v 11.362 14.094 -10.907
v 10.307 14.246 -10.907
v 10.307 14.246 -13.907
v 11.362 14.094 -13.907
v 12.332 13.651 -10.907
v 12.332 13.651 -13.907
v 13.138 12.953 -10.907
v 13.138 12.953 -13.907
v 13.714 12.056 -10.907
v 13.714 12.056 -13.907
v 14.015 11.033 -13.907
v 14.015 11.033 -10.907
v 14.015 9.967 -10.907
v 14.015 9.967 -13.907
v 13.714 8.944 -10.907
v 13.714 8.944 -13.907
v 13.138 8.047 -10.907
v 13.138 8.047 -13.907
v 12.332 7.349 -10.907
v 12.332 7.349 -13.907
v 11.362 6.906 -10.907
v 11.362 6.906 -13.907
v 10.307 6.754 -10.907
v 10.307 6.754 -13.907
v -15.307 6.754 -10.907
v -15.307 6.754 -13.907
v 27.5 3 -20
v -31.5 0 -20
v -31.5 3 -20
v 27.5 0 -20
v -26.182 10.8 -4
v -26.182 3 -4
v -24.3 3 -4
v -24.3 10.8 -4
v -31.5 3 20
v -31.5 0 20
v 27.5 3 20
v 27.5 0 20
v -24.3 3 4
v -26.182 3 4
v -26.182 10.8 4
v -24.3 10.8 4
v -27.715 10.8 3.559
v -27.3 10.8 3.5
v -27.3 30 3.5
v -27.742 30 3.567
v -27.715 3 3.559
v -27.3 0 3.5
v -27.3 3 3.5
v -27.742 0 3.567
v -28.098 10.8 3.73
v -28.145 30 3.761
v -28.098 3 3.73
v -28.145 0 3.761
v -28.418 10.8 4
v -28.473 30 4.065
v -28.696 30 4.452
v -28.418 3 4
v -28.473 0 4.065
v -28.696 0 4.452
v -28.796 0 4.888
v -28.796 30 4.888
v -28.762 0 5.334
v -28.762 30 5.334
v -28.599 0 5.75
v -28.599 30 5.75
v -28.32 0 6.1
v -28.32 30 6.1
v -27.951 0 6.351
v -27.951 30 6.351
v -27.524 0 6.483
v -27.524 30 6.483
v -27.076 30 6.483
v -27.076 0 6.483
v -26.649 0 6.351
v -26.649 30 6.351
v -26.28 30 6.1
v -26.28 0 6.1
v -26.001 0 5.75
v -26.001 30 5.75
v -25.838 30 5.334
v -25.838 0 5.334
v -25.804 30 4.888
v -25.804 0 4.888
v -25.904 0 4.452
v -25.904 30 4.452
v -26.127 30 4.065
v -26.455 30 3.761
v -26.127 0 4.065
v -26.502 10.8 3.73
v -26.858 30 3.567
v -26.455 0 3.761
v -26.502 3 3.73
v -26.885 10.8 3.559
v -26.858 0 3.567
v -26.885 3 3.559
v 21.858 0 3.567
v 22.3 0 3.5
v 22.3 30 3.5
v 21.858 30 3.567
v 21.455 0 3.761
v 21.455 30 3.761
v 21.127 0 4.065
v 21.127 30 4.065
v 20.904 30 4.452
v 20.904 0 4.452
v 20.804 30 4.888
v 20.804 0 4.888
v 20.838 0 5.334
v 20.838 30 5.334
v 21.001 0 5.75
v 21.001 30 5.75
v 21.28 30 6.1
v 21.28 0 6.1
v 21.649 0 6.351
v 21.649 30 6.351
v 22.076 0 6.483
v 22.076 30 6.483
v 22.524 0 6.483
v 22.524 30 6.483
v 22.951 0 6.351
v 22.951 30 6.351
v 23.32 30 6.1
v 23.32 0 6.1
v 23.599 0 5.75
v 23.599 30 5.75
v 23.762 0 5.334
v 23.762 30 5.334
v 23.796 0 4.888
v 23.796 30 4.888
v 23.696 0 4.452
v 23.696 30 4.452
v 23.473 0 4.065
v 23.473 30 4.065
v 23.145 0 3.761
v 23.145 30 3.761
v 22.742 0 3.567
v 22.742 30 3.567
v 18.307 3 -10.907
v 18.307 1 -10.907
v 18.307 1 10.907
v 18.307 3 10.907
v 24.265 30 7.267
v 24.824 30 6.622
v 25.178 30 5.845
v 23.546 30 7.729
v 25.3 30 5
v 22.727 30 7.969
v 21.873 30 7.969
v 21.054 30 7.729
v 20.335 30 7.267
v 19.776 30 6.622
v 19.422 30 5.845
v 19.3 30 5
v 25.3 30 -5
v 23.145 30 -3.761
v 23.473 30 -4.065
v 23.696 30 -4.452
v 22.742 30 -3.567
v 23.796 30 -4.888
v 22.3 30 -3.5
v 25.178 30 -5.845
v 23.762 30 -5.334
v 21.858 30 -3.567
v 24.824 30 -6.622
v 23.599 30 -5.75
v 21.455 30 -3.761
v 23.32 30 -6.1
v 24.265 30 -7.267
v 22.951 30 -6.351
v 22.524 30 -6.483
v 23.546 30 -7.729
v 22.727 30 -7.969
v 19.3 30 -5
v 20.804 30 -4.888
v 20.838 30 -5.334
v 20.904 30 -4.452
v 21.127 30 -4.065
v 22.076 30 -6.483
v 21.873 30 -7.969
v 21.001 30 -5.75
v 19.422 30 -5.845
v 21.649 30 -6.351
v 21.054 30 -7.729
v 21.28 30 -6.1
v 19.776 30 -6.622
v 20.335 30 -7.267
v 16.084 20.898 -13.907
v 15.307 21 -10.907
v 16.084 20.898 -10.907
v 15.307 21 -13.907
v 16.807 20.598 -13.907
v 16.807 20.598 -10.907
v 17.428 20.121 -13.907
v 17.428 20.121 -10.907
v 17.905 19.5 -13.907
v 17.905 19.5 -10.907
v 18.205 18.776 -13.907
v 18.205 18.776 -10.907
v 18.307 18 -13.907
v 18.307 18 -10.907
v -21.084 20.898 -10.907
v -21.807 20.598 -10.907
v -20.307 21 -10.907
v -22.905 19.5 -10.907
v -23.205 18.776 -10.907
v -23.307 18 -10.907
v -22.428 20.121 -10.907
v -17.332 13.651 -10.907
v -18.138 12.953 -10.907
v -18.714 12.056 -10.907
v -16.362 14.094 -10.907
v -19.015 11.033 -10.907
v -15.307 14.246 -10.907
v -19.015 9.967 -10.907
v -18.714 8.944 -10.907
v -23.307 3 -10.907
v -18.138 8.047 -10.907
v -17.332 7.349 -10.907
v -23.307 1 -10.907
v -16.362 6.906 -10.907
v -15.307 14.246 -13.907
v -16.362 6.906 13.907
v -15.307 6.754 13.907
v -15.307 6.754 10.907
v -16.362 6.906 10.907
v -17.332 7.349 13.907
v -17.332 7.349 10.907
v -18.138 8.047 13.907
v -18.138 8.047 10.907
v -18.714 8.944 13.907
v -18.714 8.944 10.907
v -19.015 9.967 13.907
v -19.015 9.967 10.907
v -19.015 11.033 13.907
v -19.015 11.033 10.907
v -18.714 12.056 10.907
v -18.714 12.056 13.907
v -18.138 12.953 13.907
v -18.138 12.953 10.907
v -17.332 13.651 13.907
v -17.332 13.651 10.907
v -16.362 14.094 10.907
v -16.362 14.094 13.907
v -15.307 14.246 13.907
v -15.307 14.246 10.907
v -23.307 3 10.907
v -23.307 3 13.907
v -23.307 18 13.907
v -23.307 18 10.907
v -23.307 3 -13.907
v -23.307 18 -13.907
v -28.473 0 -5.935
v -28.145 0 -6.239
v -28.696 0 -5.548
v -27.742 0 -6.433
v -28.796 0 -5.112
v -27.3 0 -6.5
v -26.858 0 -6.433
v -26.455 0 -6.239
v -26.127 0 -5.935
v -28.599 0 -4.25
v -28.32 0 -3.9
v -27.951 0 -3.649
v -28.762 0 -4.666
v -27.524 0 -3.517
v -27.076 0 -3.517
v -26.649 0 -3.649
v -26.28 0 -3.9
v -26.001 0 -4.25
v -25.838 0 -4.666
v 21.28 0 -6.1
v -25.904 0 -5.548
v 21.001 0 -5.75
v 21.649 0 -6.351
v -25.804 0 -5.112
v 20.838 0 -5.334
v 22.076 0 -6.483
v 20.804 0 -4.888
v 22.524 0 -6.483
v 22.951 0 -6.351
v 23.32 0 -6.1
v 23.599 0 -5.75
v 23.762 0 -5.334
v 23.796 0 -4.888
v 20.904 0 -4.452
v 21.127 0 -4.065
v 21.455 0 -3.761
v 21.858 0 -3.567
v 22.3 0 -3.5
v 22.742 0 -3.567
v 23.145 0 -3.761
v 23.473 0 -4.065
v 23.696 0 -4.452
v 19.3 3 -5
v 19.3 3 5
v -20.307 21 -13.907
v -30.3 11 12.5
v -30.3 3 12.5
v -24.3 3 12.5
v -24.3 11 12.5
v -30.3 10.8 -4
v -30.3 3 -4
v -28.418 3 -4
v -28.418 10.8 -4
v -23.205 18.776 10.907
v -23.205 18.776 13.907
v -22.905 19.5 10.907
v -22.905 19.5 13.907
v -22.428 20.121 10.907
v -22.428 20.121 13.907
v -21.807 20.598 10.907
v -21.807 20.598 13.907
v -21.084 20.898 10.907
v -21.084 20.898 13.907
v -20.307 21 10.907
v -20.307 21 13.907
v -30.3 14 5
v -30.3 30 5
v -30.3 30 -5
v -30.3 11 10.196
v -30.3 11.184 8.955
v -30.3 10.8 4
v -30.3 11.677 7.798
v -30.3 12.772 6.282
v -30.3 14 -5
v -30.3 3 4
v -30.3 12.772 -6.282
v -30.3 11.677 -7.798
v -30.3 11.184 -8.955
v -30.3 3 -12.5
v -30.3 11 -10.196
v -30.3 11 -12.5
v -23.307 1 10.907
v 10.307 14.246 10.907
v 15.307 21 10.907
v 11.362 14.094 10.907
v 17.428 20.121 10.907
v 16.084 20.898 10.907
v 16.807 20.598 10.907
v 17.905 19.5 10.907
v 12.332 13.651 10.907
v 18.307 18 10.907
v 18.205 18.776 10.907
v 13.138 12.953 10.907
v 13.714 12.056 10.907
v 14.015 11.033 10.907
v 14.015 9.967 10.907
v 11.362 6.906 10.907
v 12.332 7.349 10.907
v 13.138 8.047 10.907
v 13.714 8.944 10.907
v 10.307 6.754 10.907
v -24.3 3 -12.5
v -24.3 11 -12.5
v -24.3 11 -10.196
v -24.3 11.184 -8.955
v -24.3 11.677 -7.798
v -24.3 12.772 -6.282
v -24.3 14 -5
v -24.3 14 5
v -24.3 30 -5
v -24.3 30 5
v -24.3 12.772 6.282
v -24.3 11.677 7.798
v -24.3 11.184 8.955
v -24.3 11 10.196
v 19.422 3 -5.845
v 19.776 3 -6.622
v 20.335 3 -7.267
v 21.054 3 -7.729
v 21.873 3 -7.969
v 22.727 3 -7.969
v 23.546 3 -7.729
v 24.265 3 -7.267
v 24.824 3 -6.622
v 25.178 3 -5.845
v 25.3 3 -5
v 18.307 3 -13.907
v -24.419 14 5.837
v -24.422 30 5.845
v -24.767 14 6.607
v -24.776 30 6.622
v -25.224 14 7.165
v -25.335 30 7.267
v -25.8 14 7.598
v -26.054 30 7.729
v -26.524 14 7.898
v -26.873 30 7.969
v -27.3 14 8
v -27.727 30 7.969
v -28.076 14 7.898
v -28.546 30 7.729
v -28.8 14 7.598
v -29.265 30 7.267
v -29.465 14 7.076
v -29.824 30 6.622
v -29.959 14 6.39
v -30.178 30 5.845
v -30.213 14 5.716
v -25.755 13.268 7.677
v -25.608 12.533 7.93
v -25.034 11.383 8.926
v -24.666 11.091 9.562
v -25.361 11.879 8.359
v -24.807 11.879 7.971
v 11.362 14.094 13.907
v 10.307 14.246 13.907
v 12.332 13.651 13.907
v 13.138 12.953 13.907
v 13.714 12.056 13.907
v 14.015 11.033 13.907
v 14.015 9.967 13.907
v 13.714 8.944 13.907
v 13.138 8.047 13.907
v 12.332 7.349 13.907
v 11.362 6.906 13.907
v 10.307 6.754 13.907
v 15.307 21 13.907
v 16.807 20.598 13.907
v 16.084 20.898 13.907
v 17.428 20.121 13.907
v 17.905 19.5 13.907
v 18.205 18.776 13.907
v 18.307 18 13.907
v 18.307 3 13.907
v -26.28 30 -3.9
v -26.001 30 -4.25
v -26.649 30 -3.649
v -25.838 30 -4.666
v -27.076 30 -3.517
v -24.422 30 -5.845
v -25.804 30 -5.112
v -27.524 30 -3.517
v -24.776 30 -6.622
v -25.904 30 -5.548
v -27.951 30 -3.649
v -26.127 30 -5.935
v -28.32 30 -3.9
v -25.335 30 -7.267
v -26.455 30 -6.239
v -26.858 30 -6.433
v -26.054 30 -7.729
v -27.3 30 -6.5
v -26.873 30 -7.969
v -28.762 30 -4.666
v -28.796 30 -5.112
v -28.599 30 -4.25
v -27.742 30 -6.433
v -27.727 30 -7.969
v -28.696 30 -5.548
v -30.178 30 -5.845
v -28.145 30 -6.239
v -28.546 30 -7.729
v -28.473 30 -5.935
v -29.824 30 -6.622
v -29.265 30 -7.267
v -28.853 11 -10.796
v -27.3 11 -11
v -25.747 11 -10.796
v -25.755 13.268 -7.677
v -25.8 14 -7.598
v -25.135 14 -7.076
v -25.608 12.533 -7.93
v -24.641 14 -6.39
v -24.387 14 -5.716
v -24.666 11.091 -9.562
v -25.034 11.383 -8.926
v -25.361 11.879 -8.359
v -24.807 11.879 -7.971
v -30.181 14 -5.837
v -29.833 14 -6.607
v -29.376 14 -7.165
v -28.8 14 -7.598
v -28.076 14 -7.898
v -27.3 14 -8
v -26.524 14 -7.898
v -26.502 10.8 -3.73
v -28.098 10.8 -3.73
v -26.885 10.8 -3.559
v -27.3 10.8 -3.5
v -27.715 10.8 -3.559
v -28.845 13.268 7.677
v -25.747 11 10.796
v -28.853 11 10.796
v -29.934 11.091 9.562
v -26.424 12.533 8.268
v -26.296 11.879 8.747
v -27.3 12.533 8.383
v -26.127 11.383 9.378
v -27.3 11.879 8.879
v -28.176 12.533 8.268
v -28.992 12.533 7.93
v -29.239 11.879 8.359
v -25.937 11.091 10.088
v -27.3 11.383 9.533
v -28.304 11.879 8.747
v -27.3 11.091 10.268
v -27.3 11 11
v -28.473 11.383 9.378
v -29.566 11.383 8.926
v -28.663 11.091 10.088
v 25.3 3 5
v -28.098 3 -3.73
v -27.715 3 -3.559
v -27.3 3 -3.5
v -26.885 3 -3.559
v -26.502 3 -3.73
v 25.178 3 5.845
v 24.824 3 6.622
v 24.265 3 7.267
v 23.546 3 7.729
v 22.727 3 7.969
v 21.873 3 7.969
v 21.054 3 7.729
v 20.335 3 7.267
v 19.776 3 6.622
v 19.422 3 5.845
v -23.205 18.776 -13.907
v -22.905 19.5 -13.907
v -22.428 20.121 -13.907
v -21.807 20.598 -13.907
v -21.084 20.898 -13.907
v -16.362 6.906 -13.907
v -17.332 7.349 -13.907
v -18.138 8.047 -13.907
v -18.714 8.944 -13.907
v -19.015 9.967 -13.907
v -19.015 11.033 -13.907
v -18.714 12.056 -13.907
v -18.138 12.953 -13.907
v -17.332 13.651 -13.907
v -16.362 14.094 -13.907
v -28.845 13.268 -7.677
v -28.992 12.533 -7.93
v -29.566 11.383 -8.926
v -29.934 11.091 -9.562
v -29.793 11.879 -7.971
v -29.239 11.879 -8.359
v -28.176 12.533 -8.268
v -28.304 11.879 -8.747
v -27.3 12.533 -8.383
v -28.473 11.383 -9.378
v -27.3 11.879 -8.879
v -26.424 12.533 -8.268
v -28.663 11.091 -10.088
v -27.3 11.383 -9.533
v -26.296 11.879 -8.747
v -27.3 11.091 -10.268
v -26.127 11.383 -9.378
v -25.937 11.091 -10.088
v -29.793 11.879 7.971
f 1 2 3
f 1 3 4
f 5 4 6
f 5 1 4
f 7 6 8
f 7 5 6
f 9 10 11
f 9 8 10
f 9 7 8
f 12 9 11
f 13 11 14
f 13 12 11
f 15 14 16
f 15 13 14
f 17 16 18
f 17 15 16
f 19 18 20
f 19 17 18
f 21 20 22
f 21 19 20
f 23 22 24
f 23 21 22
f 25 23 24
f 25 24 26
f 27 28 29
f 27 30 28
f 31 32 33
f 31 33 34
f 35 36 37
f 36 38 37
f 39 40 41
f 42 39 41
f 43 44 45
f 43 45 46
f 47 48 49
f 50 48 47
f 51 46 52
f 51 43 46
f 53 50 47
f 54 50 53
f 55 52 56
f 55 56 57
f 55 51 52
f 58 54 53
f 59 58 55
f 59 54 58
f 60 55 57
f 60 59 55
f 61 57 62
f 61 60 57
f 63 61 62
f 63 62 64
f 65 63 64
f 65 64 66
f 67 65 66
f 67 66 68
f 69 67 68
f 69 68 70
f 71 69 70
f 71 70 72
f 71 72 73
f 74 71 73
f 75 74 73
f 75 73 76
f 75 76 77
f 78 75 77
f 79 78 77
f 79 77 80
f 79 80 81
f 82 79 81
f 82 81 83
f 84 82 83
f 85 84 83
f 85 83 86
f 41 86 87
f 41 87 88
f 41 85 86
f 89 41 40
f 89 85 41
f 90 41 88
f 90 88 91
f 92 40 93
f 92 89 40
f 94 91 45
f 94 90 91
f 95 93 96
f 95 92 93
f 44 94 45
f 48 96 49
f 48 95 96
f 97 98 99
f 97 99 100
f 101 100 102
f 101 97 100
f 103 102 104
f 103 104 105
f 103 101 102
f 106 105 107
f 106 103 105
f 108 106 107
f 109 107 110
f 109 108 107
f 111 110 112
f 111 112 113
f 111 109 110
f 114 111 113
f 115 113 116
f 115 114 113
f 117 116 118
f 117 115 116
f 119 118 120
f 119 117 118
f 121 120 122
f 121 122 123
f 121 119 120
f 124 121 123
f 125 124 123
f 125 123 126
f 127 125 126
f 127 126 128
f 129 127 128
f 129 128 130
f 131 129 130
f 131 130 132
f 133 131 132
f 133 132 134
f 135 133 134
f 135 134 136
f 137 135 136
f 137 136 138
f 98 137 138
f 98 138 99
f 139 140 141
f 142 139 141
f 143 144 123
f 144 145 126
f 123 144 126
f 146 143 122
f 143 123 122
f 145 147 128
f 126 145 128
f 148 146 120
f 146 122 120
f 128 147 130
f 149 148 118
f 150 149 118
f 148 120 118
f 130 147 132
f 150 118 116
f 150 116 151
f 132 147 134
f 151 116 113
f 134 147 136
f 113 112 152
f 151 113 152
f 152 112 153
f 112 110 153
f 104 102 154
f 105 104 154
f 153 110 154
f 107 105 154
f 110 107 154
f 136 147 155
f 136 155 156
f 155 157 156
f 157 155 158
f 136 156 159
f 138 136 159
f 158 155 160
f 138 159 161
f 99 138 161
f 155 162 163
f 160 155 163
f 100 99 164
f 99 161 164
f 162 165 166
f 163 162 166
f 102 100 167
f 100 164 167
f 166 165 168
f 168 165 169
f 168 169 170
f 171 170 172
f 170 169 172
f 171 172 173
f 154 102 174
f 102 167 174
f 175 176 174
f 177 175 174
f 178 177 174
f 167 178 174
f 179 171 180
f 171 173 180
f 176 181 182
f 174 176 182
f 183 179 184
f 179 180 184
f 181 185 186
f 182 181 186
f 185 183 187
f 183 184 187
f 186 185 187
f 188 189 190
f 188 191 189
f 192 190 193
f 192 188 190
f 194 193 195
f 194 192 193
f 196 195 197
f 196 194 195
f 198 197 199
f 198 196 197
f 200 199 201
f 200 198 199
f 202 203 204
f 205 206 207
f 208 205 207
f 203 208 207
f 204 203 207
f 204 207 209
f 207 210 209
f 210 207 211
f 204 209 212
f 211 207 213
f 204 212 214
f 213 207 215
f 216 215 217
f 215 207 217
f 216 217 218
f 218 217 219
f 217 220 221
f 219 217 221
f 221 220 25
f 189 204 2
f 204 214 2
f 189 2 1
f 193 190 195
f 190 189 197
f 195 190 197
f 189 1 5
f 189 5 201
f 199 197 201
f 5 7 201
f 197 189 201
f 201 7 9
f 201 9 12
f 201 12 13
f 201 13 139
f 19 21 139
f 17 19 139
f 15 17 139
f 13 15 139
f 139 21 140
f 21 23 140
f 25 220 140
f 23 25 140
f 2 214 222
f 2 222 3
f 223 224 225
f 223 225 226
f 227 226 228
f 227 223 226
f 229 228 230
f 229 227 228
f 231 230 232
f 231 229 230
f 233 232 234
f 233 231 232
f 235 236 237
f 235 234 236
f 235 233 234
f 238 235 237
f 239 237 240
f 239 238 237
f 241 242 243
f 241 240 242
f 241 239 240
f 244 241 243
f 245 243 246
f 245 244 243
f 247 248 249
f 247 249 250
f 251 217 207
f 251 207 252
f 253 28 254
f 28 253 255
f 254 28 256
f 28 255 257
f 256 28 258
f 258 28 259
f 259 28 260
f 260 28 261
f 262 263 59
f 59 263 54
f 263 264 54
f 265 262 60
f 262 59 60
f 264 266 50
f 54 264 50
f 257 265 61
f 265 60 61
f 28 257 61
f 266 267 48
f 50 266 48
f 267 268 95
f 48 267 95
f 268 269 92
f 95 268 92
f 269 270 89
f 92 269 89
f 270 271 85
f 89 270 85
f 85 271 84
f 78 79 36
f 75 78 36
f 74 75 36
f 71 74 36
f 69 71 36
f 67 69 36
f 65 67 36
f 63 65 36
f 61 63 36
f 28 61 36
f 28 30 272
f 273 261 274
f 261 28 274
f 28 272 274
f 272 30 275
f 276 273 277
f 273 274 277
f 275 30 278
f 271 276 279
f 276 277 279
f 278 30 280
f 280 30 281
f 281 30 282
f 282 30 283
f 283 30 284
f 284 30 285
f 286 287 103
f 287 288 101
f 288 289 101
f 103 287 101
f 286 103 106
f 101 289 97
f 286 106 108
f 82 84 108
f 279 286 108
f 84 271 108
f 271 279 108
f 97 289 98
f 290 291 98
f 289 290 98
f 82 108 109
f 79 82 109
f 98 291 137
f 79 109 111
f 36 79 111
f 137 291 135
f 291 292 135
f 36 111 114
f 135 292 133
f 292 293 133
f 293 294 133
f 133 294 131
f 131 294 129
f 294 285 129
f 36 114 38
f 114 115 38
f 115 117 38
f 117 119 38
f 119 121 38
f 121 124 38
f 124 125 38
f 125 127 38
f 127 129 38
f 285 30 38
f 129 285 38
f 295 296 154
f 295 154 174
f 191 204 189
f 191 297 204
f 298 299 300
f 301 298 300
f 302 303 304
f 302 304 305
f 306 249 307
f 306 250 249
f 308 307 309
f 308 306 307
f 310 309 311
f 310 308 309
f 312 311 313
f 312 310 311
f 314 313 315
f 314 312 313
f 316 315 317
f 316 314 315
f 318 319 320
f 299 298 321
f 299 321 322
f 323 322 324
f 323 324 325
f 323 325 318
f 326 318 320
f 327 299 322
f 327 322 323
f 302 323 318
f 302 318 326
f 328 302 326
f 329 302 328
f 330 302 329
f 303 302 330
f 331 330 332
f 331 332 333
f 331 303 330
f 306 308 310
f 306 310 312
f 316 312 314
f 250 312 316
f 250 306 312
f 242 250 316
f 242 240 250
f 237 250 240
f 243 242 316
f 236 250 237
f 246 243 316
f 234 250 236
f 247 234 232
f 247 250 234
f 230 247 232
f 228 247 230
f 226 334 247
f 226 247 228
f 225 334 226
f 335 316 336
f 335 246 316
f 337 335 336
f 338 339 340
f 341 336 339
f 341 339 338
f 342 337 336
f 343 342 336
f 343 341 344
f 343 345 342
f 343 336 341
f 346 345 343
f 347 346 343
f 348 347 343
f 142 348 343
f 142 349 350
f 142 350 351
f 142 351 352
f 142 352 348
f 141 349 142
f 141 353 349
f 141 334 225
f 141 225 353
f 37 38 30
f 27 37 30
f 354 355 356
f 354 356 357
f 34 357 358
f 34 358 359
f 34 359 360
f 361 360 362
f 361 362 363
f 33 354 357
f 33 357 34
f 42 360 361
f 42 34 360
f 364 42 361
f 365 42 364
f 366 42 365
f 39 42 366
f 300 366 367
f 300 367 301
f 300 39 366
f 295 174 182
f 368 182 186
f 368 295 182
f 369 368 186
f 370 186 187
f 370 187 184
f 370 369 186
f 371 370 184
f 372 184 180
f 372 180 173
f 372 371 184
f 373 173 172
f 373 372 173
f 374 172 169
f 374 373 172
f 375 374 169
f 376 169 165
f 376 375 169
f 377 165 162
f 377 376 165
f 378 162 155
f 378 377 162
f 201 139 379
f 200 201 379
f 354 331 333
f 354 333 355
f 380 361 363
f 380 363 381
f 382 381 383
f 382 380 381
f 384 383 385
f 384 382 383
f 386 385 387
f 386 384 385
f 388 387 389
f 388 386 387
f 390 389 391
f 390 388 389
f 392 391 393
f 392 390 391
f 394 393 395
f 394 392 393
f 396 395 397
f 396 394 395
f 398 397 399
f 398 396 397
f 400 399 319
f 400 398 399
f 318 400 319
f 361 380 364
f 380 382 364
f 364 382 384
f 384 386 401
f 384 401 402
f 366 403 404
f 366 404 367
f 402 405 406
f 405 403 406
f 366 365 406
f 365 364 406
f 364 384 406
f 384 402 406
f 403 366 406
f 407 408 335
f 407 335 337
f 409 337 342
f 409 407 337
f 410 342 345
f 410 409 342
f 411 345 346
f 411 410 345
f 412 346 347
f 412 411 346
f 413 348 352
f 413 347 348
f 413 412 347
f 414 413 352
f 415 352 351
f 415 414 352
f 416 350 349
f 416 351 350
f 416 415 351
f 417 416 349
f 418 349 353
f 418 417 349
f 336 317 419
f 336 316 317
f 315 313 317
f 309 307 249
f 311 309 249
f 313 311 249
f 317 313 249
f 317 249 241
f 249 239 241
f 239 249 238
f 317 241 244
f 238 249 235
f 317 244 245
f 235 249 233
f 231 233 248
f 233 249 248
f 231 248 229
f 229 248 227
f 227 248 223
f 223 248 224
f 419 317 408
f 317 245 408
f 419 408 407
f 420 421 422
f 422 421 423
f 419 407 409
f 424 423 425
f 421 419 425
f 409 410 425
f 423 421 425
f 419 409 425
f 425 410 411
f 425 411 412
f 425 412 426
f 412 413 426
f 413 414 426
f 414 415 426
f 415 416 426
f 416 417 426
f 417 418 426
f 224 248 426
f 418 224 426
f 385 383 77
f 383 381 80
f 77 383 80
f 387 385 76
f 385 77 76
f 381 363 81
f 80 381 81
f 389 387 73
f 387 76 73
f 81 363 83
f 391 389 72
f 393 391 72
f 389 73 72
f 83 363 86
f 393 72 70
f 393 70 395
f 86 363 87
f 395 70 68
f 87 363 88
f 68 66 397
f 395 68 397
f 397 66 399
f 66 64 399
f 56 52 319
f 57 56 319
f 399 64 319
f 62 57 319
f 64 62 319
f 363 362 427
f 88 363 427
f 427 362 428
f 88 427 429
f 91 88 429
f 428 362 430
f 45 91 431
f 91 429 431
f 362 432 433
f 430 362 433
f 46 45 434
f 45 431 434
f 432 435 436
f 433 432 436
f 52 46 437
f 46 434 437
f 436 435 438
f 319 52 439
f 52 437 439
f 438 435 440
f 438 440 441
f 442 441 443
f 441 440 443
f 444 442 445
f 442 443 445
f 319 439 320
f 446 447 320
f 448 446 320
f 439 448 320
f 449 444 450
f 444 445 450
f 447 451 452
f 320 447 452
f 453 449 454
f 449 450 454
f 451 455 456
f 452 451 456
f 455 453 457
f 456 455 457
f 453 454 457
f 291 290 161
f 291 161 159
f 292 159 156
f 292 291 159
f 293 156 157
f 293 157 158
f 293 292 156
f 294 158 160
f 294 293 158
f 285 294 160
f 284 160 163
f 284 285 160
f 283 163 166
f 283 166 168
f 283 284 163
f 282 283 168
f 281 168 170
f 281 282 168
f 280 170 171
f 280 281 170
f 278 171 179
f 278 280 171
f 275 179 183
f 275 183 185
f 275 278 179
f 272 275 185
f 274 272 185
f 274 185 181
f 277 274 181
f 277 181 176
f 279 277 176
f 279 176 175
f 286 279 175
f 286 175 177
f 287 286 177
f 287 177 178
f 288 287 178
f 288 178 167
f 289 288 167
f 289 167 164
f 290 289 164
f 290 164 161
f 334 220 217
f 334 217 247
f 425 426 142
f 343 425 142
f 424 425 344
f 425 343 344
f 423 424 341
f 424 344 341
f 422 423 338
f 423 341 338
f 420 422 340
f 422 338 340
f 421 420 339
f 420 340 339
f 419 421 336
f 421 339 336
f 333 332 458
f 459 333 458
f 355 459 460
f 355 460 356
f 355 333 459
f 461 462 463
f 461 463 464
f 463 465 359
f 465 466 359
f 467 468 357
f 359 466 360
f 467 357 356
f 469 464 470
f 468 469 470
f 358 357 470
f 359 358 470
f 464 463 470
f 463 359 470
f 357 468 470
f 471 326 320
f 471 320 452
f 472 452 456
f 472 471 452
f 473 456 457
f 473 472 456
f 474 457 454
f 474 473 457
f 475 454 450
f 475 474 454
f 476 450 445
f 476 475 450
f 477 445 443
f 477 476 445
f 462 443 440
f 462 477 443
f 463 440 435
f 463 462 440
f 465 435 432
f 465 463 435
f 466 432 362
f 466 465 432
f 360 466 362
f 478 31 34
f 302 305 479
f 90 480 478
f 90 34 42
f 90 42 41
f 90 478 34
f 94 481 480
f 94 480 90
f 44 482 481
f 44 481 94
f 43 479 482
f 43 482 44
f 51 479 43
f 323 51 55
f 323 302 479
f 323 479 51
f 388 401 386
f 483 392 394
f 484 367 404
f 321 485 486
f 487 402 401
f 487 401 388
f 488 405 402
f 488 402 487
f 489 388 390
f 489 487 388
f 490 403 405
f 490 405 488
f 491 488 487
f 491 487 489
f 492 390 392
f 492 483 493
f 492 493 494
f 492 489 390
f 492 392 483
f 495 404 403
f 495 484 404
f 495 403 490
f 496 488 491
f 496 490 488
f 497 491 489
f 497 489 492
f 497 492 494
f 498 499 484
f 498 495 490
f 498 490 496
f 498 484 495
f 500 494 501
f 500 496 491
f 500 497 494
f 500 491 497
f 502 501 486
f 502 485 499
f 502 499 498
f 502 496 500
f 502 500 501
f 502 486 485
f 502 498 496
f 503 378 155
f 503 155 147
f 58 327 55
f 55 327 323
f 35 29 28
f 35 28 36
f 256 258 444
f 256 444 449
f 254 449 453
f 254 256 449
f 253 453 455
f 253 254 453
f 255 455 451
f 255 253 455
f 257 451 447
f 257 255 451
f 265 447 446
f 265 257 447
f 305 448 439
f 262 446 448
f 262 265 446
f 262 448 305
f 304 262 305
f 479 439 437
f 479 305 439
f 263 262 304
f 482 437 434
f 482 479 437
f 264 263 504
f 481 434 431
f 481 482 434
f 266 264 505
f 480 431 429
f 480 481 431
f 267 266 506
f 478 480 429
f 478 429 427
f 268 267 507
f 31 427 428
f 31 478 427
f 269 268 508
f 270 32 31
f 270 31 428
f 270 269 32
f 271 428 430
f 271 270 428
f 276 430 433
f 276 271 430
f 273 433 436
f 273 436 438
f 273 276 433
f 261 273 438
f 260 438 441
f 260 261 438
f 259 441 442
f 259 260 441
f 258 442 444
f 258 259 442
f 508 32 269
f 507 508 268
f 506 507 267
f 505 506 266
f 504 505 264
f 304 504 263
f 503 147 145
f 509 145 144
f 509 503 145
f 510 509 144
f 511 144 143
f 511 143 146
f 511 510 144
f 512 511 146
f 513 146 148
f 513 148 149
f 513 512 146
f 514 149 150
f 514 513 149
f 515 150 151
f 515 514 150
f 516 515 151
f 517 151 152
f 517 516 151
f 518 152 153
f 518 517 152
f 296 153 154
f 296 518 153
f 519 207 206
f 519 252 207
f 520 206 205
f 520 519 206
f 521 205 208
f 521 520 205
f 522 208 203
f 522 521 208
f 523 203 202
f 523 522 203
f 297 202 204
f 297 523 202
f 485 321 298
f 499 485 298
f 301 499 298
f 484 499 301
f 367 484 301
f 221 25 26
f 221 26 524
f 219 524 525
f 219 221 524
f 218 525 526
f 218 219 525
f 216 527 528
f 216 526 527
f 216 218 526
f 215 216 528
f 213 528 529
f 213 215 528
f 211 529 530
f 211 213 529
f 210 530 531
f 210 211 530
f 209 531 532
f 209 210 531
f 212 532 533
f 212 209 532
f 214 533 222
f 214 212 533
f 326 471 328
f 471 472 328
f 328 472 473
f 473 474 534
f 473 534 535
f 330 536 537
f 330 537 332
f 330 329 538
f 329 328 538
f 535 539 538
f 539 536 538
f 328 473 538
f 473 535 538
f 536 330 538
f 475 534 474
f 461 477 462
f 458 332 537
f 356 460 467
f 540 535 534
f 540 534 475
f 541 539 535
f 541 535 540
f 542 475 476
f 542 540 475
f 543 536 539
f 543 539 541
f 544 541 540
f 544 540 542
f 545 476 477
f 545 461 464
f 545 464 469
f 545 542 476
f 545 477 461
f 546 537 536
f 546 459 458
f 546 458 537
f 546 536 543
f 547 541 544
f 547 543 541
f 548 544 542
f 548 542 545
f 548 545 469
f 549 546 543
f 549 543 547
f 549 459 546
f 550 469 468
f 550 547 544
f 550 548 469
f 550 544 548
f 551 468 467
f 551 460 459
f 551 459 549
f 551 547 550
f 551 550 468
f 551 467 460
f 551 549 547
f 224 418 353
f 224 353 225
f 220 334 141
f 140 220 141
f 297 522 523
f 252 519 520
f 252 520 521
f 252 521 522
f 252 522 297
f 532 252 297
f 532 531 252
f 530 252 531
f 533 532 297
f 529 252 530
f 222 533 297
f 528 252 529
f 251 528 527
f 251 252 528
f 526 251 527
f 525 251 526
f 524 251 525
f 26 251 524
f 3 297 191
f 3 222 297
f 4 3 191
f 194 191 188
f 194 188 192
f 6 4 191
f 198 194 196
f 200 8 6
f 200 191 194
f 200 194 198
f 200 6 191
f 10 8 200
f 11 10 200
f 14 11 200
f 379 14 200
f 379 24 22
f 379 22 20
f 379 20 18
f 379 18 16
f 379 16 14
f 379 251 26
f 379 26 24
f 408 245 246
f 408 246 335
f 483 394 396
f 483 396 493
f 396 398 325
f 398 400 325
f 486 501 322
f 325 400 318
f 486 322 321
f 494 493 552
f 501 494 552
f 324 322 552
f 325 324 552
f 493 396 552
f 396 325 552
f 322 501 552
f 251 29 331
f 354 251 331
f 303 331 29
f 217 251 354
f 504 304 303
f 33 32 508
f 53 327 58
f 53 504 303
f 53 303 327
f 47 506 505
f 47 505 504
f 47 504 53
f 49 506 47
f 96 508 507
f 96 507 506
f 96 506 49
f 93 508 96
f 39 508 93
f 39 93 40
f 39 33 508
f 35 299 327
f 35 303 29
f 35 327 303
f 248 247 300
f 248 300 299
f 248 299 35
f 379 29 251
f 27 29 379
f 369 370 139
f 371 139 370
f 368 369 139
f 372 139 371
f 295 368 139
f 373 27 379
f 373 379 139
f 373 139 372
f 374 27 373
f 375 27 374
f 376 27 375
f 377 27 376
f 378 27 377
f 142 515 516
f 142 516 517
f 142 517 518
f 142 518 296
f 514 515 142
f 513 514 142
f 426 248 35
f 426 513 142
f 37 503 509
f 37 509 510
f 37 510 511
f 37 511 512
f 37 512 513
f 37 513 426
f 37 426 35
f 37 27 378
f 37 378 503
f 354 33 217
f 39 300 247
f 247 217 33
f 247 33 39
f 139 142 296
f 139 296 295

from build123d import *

# Parameters (mm, degrees)
SKETCH_1_W          = 55
SKETCH_1_H          = 40
SKETCH_1_R          = 1.5
EXTRUDE_1_DEPTH     = 3
SKETCH_2_W          = 40
SKETCH_2_H          = 3
EXTRUDE_2_DEPTH     = 4
CUT_EXTRUDE_1_REACH = 39.433
SKETCH_3_R          = 1.5
SKETCH_4_R          = 10.5
EXTRUDE_3_DEPTH     = 5
CUT_EXTRUDE_4_REACH = 40.646
CUT_EXTRUDE_START   = -1
SKETCH_5_W          = 41.614213562
SKETCH_5_H          = 21.814213562
SKETCH_6_R          = 1.5
EXTRUDE_5_DEPTH     = 27
SKETCH_7_W          = 6
SKETCH_7_H          = 25
SKETCH_7_R          = 1.5
EXTRUDE_6_DEPTH     = 8
CUT_EXTRUDE_5_REACH = 70.124
SKETCH_8_W          = 8
SKETCH_8_H          = 7.8
FILLET_1_R          = 3
FILLET_2_R          = 3
CUT_EXTRUDE_START_2 = -5
SKETCH_9_R          = 10.5
CUT_EXTRUDE_6_DEPTH = 5
SKETCH_10_W         = 41.614213562
SKETCH_10_H         = 3
EXTRUDE_7_DEPTH     = 18
FILLET_3_R          = 3
CUT_EXTRUDE_7_REACH = 57.154


with BuildPart() as part:
    # 草图1 → 凸台-拉伸1 (new body)
    with BuildSketch(Plane(origin=(0, 0, 0), x_dir=(1, 0, 0), z_dir=(0, 1, 0))):
        Rectangle(SKETCH_1_W, SKETCH_1_H)
        with Locations(Location((22.3, 5, 0), (0, 0, 270))):
            Circle(SKETCH_1_R, mode=Mode.SUBTRACT)
        with Locations(Location((22.3, -5, 0), (0, 0, 90))):
            Circle(SKETCH_1_R, mode=Mode.SUBTRACT)
    extrude(amount=EXTRUDE_1_DEPTH)

    # 草图2 → 凸台-拉伸2 (add)
    with BuildSketch(Plane.ZY.offset(27.5)):
        with Locations((0, 1.5)):
            Rectangle(SKETCH_2_W, SKETCH_2_H)
    extrude(amount=EXTRUDE_2_DEPTH)

    # 草图3 → 切除-拉伸1 (cut, up to next)
    with BuildSketch(Plane.XZ, mode=Mode.PRIVATE) as cut_extrude_1_sk1:
        with Locations(Location((-27.3, 5, 0), (0, 0, 270))):
            Circle(SKETCH_3_R)
    cut_extrude_1_tool1 = extrude(cut_extrude_1_sk1.sketch, amount=-CUT_EXTRUDE_1_REACH, mode=Mode.PRIVATE) & part.part
    # 草图3 → 切除-拉伸1 (cut, up to next)
    with BuildSketch(Plane.XZ, mode=Mode.PRIVATE) as cut_extrude_1_sk2:
        with Locations(Location((-27.3, -5, 0), (0, 0, 270))):
            Circle(SKETCH_3_R)
    cut_extrude_1_tool2 = extrude(cut_extrude_1_sk2.sketch, amount=-CUT_EXTRUDE_1_REACH, mode=Mode.PRIVATE) & part.part
    add(cut_extrude_1_tool1.solids().sort_by_distance((-27.3, 0, 5))[0], mode=Mode.SUBTRACT)
    add(cut_extrude_1_tool2.solids().sort_by_distance((-27.3, 0, -5))[0], mode=Mode.SUBTRACT)

    # 草图4 → 凸台-拉伸3 (add)
    with BuildSketch(Plane.XZ):
        with Locations(Location((-12.5, 0, 0), (0, 0, 90))):
            Circle(SKETCH_4_R)
    extrude(amount=EXTRUDE_3_DEPTH)

    # 草图5 → 切除-拉伸4 (cut, up to next)
    with BuildSketch(Plane.XZ.offset(CUT_EXTRUDE_START), mode=Mode.PRIVATE) as cut_extrude_4_sk1:
        with Locations((-2.5, 0)):
            Rectangle(SKETCH_5_W, SKETCH_5_H)
    cut_extrude_4_tool1 = extrude(cut_extrude_4_sk1.sketch, amount=-CUT_EXTRUDE_4_REACH, mode=Mode.PRIVATE) & part.part
    add(cut_extrude_4_tool1.solids().sort_by_distance((-2.5, 1, 0))[0], mode=Mode.SUBTRACT)

    # 草图6 → 凸台-拉伸5 (add)
    # profile 1 of 2: a face of its own
    with BuildSketch(Plane(origin=(0, 3, 0), x_dir=(1, 0, 0), z_dir=(0, 1, 0))):
        with BuildLine():
            Line((-30.3, -5), (-30.3, 5))
            ThreePointArc((-30.3, 5), (-27.3, 8), (-24.3, 5))
            Line((-24.3, 5), (-24.3, -5))
            ThreePointArc((-24.3, -5), (-27.3, -8), (-30.3, -5))
        make_face()
        with Locations(Location((-27.3, -5, 0), (0, 0, 90))):
            Circle(SKETCH_6_R, mode=Mode.SUBTRACT)
        with Locations(Location((-27.3, 5, 0), (0, 0, 90))):
            Circle(SKETCH_6_R, mode=Mode.SUBTRACT)
    # profile 2 of 2: a face of its own
    with BuildSketch(Plane(origin=(0, 3, 0), x_dir=(1, 0, 0), z_dir=(0, 1, 0))):
        with BuildLine():
            Line((19.3, -5), (19.3, 5))
            ThreePointArc((19.3, 5), (22.3, 8), (25.3, 5))
            Line((25.3, 5), (25.3, -5))
            ThreePointArc((25.3, -5), (22.3, -8), (19.3, -5))
        make_face()
        with Locations(Location((22.3, 5, 0), (0, 0, 270))):
            Circle(SKETCH_6_R, mode=Mode.SUBTRACT)
        with Locations(Location((22.3, -5, 0), (0, 0, 90))):
            Circle(SKETCH_6_R, mode=Mode.SUBTRACT)
    extrude(amount=EXTRUDE_5_DEPTH)

    # 草图7 → 凸台-拉伸6 (add)
    with BuildSketch(Plane(origin=(0, 3, 0), x_dir=(1, 0, 0), z_dir=(0, 1, 0))):
        with Locations((-27.3, 0)):
            Rectangle(SKETCH_7_W, SKETCH_7_H)
        with Locations(Location((-27.3, -5, 0), (0, 0, 90))):
            Circle(SKETCH_7_R, mode=Mode.SUBTRACT)
        with Locations(Location((-27.3, 5, 0), (0, 0, 90))):
            Circle(SKETCH_7_R, mode=Mode.SUBTRACT)
    extrude(amount=EXTRUDE_6_DEPTH)

    # 草图8 → 切除-拉伸5 (cut, up to next)
    with BuildSketch(Plane.ZY.offset(30.3), mode=Mode.PRIVATE) as cut_extrude_5_sk1:
        with Locations((0, 6.9)):
            Rectangle(SKETCH_8_W, SKETCH_8_H)
    cut_extrude_5_tool1 = extrude(cut_extrude_5_sk1.sketch, amount=-CUT_EXTRUDE_5_REACH, mode=Mode.PRIVATE) & part.part
    add(cut_extrude_5_tool1.solids().sort_by_distance((-30.3, 6.9, 0))[0], mode=Mode.SUBTRACT)

    # 圆角1
    fillet_1_edges = [part.edges().sort_by_distance(p)[0] for p in [
        (-27.3, 11, 8),
    ]]
    fillet(fillet_1_edges, radius=FILLET_1_R)

    # 圆角2
    fillet_2_edges = [part.edges().sort_by_distance(p)[0] for p in [
        (-27.3, 11, -8),
    ]]
    fillet(fillet_2_edges, radius=FILLET_2_R)

    # 草图9 → 切除-拉伸6 (cut)
    with BuildSketch(Plane.XZ.offset(5).offset(CUT_EXTRUDE_START_2)):
        with Locations((-12.5, 0)):
            Circle(SKETCH_9_R)
    extrude(amount=CUT_EXTRUDE_6_DEPTH, mode=Mode.SUBTRACT)

    # 草图10 → 凸台-拉伸7 (add)
    with BuildSketch(Plane(origin=(0, 3, 0), x_dir=(1, 0, 0), z_dir=(0, 1, 0))):
        with Locations((-2.5, 12.407106781)):
            Rectangle(SKETCH_10_W, SKETCH_10_H)
        with Locations((-2.5, -12.407106781)):
            Rectangle(SKETCH_10_W, SKETCH_10_H)
    extrude(amount=EXTRUDE_7_DEPTH)

    # 圆角3
    fillet_3_edges = [part.edges().sort_by_distance(p)[0] for p in [
        (-23.307106781, 21, -12.407106781),
        (18.307106781, 21, -12.407106781),
        (18.307106781, 21, 12.407106781),
        (-23.307106781, 21, 12.407106781),
    ]]
    fillet(fillet_3_edges, radius=FILLET_3_R)

    # 切除-拉伸7: up to this face of the body (flat: up to its plane)
    cut_extrude_7_end = Plane(part.part.faces().sort_by_distance((-2.5, 11.956820585, -13.907106781))[0])
    # 草图11 → 切除-拉伸7 (cut, up to the picked face)
    with BuildSketch(Plane.XY.offset(13.907106781), mode=Mode.PRIVATE) as cut_extrude_7_sk1:
        with BuildLine():
            Line((-15.307106781, 14.245523658), (10.307106781, 14.245523658))
            ThreePointArc((10.307106781, 14.245523658), (14.052630439, 10.5), (10.307106781, 6.754476342))
            Line((10.307106781, 6.754476342), (-15.307106781, 6.754476342))
            ThreePointArc((-15.307106781, 6.754476342), (-19.052630439, 10.5), (-15.307106781, 14.245523658))
        make_face()
    cut_extrude_7_tool1 = split(extrude(cut_extrude_7_sk1.sketch, amount=-CUT_EXTRUDE_7_REACH, mode=Mode.PRIVATE), bisect_by=cut_extrude_7_end, keep=Keep.BOTH, mode=Mode.PRIVATE)
    add(cut_extrude_7_tool1.solids().sort_by(Axis((-2.5, 10.5, 13.907107), (0, 0, -1)))[0], mode=Mode.SUBTRACT)


solid = part.part
